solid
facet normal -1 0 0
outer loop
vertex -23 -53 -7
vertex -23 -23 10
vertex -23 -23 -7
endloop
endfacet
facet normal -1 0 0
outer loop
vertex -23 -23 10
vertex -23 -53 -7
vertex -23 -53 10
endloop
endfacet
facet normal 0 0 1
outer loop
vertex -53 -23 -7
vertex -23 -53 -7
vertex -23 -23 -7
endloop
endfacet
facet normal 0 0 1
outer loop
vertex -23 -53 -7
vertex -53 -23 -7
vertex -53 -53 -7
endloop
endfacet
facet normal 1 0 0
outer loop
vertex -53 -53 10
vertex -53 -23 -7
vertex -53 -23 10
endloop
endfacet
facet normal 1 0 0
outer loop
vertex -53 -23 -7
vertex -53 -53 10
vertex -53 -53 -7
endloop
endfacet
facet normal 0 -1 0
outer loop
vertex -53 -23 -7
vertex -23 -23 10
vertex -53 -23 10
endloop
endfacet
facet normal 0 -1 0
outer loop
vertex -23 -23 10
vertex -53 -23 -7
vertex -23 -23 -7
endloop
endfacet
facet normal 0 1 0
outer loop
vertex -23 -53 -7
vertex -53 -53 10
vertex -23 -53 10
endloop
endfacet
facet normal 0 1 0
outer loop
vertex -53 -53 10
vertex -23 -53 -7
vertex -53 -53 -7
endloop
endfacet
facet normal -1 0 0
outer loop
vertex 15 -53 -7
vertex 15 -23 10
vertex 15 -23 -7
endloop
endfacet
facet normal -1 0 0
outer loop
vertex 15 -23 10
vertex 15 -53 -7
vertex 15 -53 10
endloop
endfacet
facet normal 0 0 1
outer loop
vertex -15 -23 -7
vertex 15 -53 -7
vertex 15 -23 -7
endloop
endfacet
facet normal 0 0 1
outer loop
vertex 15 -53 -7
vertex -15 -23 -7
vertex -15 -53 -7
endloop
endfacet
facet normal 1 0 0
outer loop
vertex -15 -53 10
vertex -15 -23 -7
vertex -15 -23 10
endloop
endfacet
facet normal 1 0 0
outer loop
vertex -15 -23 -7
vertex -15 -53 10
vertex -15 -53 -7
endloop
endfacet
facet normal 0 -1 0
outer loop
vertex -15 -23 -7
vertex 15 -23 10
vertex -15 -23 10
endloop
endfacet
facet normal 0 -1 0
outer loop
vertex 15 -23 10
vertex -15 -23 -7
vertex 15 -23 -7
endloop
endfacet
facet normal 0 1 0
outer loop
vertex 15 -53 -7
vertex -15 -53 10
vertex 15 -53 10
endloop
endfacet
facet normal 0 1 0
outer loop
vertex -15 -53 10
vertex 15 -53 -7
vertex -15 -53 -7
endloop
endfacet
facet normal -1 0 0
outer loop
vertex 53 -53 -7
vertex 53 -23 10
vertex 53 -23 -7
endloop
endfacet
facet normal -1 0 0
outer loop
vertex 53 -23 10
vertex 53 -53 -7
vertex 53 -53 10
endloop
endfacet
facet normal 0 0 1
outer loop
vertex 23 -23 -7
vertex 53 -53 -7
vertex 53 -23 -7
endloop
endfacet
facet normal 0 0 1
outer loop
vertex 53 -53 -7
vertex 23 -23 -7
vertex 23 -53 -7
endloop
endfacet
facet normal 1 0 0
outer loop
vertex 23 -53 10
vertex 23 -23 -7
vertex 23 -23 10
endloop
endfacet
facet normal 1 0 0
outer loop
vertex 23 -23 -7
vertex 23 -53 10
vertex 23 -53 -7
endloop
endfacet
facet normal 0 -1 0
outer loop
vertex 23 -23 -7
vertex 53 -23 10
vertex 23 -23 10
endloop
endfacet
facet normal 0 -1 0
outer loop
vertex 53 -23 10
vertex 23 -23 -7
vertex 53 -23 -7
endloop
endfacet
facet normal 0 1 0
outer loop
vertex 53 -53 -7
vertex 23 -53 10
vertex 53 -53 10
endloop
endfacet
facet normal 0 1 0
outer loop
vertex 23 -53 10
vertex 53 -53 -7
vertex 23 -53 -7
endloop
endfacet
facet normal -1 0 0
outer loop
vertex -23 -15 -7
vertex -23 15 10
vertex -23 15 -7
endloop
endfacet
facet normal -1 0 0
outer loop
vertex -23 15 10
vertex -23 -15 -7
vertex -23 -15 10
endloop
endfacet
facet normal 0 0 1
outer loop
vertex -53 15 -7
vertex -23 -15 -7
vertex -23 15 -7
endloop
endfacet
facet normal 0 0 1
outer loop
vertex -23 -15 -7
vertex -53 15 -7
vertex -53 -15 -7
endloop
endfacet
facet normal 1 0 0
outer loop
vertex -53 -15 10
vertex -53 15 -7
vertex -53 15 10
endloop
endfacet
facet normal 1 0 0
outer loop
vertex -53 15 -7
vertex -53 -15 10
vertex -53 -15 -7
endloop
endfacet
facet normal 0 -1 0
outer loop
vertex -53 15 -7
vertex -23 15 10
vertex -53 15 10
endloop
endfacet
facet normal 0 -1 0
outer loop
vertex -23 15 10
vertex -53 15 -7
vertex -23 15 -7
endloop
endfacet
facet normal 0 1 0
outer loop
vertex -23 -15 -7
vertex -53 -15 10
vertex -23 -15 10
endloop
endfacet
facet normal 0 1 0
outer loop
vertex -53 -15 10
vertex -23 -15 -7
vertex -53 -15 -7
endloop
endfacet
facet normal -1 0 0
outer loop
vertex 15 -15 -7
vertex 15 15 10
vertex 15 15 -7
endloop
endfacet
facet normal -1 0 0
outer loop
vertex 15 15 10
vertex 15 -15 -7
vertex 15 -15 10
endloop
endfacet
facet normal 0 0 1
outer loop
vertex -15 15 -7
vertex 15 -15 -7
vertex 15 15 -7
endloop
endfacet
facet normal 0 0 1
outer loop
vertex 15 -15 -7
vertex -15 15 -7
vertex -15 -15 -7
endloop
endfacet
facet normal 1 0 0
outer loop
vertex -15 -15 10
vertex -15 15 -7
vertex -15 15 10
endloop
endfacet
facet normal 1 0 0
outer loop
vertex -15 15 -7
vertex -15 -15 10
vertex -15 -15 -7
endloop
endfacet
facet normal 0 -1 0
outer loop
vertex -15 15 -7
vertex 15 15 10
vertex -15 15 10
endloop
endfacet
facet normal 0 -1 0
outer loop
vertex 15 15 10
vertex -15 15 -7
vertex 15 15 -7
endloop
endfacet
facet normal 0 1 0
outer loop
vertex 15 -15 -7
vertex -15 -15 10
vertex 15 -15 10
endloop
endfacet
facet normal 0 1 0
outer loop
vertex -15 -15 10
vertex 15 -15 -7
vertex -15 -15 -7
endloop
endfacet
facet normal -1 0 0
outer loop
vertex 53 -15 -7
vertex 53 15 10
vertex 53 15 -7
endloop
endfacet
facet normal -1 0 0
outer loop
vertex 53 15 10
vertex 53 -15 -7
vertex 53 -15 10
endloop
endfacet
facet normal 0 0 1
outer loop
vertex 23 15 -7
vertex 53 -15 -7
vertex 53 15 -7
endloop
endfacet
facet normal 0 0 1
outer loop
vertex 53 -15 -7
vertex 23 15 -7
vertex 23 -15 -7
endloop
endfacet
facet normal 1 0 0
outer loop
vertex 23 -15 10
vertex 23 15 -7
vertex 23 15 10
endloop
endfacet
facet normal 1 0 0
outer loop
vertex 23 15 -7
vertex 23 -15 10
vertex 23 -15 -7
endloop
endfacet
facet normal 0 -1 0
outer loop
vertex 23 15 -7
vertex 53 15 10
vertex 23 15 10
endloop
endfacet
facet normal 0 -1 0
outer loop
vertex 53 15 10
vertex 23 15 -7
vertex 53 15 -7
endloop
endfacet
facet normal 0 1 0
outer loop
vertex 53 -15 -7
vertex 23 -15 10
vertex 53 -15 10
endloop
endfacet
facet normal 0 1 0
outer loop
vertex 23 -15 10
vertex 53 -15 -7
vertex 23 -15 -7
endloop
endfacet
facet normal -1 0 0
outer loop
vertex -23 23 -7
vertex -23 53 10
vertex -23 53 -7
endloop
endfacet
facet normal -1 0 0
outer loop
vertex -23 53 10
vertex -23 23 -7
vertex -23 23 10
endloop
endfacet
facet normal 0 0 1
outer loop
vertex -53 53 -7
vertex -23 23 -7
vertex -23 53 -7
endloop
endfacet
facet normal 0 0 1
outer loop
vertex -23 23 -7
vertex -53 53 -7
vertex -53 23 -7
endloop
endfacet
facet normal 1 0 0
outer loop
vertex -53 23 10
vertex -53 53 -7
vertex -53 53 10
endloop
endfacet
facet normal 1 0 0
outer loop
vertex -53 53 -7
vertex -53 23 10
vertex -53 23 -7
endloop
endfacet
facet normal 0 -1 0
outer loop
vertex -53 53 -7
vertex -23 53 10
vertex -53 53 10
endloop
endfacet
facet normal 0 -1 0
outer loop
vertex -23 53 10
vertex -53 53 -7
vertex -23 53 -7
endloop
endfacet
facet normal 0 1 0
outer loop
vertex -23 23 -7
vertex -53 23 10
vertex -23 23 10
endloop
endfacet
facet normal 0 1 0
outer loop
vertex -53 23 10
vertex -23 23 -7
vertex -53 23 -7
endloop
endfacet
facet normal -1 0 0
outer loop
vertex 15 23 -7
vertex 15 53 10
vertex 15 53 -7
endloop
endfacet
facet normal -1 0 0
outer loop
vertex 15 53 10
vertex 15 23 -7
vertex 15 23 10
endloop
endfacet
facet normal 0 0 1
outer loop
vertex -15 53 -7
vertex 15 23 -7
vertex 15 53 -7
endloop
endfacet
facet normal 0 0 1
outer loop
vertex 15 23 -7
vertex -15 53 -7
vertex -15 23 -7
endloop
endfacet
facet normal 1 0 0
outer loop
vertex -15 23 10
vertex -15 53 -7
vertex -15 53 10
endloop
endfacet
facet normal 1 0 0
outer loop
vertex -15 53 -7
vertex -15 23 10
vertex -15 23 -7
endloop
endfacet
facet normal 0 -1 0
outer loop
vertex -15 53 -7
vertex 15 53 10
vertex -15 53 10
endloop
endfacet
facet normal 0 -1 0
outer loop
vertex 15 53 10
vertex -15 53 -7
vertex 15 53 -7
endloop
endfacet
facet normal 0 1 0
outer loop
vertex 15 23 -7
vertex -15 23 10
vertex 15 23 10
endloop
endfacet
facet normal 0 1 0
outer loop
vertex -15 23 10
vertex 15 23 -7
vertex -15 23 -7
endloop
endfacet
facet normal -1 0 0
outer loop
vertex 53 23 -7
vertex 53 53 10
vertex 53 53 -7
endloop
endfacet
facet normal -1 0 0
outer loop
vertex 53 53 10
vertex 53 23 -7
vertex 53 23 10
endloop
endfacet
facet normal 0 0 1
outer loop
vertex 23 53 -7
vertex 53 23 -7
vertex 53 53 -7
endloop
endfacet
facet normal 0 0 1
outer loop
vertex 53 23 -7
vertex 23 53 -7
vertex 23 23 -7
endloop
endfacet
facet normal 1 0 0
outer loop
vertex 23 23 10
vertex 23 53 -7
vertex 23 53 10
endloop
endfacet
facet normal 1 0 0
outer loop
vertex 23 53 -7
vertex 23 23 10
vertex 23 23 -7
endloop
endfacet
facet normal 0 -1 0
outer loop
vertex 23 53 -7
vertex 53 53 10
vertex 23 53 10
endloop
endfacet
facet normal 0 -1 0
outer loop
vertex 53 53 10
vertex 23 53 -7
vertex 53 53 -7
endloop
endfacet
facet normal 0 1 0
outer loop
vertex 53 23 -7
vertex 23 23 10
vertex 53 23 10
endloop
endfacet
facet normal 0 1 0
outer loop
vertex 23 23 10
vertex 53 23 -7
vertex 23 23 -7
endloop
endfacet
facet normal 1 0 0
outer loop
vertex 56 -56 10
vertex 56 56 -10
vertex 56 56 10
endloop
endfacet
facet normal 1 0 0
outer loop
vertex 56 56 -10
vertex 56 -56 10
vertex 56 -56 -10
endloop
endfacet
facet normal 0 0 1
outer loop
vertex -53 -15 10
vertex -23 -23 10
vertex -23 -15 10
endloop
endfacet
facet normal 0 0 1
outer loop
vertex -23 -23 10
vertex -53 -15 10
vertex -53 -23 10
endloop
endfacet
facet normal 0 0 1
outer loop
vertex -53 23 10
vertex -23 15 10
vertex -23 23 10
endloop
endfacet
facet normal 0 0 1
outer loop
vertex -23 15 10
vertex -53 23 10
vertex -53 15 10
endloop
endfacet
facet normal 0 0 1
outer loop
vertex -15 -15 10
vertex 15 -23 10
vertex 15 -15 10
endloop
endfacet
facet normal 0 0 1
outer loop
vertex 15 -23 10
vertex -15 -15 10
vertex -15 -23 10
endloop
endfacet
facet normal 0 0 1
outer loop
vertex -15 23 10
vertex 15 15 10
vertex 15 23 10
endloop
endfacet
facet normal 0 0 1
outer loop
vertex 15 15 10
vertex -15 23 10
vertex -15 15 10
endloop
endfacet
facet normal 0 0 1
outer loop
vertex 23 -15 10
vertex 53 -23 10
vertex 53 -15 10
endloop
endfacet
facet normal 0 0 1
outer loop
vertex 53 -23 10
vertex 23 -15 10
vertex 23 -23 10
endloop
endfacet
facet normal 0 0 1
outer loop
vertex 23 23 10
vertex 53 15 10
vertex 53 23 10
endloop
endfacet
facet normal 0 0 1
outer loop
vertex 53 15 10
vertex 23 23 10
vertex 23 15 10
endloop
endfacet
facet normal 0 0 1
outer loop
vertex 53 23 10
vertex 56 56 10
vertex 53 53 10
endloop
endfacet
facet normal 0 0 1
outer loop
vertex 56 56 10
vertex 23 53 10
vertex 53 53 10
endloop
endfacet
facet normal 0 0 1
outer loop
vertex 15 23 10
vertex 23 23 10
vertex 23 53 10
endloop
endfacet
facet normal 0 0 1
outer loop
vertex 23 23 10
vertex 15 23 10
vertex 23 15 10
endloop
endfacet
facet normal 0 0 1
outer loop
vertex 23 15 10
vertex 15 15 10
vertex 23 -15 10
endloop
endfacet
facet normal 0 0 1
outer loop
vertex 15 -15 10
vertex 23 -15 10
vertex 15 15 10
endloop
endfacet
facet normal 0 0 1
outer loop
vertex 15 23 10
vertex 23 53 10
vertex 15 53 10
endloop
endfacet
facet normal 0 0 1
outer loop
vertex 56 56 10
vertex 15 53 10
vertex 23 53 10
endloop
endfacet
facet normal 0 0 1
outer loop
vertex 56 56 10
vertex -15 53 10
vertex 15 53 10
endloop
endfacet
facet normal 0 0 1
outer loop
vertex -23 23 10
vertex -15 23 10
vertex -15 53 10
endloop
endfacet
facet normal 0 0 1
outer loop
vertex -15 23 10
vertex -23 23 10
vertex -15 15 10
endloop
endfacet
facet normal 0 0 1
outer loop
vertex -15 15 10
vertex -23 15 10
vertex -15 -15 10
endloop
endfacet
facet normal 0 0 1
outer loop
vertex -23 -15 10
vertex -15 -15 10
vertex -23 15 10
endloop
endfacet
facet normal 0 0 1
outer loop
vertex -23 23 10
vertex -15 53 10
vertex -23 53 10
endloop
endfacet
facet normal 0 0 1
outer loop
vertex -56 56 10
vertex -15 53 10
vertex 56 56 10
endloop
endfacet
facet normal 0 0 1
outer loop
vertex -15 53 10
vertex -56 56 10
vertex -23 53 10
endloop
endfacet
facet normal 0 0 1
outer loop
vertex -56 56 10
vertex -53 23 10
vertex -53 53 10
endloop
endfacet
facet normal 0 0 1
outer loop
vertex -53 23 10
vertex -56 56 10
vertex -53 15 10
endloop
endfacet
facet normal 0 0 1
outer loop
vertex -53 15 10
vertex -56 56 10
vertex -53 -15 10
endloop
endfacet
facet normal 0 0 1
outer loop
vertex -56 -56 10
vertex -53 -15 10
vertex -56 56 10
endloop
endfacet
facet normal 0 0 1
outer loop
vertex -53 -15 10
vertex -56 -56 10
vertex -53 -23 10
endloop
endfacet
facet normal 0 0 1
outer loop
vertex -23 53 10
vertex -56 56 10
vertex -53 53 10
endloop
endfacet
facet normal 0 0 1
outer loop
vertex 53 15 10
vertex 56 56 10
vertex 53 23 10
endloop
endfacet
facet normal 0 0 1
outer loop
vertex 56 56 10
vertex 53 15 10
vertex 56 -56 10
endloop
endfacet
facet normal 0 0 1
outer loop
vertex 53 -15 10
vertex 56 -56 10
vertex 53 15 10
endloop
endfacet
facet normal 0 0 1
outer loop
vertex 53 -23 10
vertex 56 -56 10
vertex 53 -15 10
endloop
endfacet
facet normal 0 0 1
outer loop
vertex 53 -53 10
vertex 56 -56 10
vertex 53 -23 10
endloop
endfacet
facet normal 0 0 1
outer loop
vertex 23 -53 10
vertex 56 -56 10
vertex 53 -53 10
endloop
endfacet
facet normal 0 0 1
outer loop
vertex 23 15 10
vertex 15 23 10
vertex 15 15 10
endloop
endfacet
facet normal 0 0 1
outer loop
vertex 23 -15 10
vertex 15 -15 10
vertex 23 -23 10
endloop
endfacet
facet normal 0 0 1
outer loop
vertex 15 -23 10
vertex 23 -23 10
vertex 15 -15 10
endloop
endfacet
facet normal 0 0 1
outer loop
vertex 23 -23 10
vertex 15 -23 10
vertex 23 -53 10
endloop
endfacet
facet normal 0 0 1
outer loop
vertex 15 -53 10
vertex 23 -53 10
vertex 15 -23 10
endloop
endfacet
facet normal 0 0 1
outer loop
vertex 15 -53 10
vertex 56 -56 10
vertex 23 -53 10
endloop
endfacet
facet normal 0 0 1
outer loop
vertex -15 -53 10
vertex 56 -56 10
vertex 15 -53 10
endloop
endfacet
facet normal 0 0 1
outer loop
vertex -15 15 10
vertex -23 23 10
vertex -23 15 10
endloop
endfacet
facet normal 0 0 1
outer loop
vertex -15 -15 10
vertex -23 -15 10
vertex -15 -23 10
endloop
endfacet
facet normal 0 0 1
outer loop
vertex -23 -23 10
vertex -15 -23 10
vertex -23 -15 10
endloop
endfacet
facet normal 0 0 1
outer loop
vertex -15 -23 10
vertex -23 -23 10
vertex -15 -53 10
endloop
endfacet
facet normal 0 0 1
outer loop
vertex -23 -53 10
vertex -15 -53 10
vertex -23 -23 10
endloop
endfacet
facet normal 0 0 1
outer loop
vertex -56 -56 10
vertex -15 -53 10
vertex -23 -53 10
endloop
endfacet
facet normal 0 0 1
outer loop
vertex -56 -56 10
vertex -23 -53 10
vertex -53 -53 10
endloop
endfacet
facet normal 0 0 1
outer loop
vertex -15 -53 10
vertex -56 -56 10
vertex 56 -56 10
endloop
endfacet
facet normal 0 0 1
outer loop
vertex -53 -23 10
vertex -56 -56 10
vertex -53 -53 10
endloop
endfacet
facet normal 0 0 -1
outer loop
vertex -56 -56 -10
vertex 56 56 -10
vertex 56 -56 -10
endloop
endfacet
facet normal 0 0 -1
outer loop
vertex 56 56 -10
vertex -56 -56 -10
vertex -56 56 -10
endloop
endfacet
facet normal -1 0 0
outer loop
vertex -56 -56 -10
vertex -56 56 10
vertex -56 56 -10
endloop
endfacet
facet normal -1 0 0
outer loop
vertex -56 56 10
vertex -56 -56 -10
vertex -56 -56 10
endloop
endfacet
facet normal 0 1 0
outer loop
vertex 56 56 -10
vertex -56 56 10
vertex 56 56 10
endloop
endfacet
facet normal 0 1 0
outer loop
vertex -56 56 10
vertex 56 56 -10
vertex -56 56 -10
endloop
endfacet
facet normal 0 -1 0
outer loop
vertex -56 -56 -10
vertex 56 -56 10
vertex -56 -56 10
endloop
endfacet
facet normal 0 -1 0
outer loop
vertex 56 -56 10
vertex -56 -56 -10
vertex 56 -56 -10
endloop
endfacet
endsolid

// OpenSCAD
$fn = 32;

// ----------------------------------------------------------------------
// Pocket plate 112 x 112 x 20
// 3 x 3 pockets 30 mm square, 17 mm deep
// ----------------------------------------------------------------------

// --- parameters (mm) ---
thickness = 20;  // plate thickness
floor_t = 3;     // material left under each pocket
pocket = 30;     // pocket side length
pitch_x = 38;    // pocket pitch along X
pitch_y = 38;    // pocket pitch along Y
cols = 3;        // pockets per row
rows = 3;        // rows of pockets

// --- derived feature positions (mm) ---
depth = thickness - floor_t;        // = 17   pocket depth, down to the floor
span_x = (cols - 1) * pitch_x;      // = 76   distance between outer pockets
span_y = (rows - 1) * pitch_y;      // = 76   distance between outer pocket rows
origin_x = -span_x / 2;             // = -38   X of the first pocket
origin_y = -span_y / 2;             // = -38   Y of the first pocket
plate = [span_x + pocket + 6, span_y + pocket + 6, thickness];  // = [112, 112, 20]   overall size: pockets plus 3 mm of wall on each side
feature_centers = [
  [origin_x + 0 * pitch_x, origin_y + 0 * pitch_y],
  [origin_x + 1 * pitch_x, origin_y + 0 * pitch_y],
  [origin_x + 2 * pitch_x, origin_y + 0 * pitch_y],
  [origin_x + 0 * pitch_x, origin_y + 1 * pitch_y],
  [origin_x + 1 * pitch_x, origin_y + 1 * pitch_y],
  [origin_x + 2 * pitch_x, origin_y + 1 * pitch_y],
  [origin_x + 0 * pitch_x, origin_y + 2 * pitch_y],
  [origin_x + 1 * pitch_x, origin_y + 2 * pitch_y],
  [origin_x + 2 * pitch_x, origin_y + 2 * pitch_y]
];   // pocket centres, used verbatim by the cutter loop

// plate outline, then one pocket per centre in feature_centers
difference() {
  cube(plate, center = true);
  for (centre = feature_centers)
    translate([centre[0] - pocket / 2, centre[1] - pocket / 2, plate[2] / 2 - depth])
      cube([pocket, pocket, depth + 1]);  // centred on the declared pocket centre
}
